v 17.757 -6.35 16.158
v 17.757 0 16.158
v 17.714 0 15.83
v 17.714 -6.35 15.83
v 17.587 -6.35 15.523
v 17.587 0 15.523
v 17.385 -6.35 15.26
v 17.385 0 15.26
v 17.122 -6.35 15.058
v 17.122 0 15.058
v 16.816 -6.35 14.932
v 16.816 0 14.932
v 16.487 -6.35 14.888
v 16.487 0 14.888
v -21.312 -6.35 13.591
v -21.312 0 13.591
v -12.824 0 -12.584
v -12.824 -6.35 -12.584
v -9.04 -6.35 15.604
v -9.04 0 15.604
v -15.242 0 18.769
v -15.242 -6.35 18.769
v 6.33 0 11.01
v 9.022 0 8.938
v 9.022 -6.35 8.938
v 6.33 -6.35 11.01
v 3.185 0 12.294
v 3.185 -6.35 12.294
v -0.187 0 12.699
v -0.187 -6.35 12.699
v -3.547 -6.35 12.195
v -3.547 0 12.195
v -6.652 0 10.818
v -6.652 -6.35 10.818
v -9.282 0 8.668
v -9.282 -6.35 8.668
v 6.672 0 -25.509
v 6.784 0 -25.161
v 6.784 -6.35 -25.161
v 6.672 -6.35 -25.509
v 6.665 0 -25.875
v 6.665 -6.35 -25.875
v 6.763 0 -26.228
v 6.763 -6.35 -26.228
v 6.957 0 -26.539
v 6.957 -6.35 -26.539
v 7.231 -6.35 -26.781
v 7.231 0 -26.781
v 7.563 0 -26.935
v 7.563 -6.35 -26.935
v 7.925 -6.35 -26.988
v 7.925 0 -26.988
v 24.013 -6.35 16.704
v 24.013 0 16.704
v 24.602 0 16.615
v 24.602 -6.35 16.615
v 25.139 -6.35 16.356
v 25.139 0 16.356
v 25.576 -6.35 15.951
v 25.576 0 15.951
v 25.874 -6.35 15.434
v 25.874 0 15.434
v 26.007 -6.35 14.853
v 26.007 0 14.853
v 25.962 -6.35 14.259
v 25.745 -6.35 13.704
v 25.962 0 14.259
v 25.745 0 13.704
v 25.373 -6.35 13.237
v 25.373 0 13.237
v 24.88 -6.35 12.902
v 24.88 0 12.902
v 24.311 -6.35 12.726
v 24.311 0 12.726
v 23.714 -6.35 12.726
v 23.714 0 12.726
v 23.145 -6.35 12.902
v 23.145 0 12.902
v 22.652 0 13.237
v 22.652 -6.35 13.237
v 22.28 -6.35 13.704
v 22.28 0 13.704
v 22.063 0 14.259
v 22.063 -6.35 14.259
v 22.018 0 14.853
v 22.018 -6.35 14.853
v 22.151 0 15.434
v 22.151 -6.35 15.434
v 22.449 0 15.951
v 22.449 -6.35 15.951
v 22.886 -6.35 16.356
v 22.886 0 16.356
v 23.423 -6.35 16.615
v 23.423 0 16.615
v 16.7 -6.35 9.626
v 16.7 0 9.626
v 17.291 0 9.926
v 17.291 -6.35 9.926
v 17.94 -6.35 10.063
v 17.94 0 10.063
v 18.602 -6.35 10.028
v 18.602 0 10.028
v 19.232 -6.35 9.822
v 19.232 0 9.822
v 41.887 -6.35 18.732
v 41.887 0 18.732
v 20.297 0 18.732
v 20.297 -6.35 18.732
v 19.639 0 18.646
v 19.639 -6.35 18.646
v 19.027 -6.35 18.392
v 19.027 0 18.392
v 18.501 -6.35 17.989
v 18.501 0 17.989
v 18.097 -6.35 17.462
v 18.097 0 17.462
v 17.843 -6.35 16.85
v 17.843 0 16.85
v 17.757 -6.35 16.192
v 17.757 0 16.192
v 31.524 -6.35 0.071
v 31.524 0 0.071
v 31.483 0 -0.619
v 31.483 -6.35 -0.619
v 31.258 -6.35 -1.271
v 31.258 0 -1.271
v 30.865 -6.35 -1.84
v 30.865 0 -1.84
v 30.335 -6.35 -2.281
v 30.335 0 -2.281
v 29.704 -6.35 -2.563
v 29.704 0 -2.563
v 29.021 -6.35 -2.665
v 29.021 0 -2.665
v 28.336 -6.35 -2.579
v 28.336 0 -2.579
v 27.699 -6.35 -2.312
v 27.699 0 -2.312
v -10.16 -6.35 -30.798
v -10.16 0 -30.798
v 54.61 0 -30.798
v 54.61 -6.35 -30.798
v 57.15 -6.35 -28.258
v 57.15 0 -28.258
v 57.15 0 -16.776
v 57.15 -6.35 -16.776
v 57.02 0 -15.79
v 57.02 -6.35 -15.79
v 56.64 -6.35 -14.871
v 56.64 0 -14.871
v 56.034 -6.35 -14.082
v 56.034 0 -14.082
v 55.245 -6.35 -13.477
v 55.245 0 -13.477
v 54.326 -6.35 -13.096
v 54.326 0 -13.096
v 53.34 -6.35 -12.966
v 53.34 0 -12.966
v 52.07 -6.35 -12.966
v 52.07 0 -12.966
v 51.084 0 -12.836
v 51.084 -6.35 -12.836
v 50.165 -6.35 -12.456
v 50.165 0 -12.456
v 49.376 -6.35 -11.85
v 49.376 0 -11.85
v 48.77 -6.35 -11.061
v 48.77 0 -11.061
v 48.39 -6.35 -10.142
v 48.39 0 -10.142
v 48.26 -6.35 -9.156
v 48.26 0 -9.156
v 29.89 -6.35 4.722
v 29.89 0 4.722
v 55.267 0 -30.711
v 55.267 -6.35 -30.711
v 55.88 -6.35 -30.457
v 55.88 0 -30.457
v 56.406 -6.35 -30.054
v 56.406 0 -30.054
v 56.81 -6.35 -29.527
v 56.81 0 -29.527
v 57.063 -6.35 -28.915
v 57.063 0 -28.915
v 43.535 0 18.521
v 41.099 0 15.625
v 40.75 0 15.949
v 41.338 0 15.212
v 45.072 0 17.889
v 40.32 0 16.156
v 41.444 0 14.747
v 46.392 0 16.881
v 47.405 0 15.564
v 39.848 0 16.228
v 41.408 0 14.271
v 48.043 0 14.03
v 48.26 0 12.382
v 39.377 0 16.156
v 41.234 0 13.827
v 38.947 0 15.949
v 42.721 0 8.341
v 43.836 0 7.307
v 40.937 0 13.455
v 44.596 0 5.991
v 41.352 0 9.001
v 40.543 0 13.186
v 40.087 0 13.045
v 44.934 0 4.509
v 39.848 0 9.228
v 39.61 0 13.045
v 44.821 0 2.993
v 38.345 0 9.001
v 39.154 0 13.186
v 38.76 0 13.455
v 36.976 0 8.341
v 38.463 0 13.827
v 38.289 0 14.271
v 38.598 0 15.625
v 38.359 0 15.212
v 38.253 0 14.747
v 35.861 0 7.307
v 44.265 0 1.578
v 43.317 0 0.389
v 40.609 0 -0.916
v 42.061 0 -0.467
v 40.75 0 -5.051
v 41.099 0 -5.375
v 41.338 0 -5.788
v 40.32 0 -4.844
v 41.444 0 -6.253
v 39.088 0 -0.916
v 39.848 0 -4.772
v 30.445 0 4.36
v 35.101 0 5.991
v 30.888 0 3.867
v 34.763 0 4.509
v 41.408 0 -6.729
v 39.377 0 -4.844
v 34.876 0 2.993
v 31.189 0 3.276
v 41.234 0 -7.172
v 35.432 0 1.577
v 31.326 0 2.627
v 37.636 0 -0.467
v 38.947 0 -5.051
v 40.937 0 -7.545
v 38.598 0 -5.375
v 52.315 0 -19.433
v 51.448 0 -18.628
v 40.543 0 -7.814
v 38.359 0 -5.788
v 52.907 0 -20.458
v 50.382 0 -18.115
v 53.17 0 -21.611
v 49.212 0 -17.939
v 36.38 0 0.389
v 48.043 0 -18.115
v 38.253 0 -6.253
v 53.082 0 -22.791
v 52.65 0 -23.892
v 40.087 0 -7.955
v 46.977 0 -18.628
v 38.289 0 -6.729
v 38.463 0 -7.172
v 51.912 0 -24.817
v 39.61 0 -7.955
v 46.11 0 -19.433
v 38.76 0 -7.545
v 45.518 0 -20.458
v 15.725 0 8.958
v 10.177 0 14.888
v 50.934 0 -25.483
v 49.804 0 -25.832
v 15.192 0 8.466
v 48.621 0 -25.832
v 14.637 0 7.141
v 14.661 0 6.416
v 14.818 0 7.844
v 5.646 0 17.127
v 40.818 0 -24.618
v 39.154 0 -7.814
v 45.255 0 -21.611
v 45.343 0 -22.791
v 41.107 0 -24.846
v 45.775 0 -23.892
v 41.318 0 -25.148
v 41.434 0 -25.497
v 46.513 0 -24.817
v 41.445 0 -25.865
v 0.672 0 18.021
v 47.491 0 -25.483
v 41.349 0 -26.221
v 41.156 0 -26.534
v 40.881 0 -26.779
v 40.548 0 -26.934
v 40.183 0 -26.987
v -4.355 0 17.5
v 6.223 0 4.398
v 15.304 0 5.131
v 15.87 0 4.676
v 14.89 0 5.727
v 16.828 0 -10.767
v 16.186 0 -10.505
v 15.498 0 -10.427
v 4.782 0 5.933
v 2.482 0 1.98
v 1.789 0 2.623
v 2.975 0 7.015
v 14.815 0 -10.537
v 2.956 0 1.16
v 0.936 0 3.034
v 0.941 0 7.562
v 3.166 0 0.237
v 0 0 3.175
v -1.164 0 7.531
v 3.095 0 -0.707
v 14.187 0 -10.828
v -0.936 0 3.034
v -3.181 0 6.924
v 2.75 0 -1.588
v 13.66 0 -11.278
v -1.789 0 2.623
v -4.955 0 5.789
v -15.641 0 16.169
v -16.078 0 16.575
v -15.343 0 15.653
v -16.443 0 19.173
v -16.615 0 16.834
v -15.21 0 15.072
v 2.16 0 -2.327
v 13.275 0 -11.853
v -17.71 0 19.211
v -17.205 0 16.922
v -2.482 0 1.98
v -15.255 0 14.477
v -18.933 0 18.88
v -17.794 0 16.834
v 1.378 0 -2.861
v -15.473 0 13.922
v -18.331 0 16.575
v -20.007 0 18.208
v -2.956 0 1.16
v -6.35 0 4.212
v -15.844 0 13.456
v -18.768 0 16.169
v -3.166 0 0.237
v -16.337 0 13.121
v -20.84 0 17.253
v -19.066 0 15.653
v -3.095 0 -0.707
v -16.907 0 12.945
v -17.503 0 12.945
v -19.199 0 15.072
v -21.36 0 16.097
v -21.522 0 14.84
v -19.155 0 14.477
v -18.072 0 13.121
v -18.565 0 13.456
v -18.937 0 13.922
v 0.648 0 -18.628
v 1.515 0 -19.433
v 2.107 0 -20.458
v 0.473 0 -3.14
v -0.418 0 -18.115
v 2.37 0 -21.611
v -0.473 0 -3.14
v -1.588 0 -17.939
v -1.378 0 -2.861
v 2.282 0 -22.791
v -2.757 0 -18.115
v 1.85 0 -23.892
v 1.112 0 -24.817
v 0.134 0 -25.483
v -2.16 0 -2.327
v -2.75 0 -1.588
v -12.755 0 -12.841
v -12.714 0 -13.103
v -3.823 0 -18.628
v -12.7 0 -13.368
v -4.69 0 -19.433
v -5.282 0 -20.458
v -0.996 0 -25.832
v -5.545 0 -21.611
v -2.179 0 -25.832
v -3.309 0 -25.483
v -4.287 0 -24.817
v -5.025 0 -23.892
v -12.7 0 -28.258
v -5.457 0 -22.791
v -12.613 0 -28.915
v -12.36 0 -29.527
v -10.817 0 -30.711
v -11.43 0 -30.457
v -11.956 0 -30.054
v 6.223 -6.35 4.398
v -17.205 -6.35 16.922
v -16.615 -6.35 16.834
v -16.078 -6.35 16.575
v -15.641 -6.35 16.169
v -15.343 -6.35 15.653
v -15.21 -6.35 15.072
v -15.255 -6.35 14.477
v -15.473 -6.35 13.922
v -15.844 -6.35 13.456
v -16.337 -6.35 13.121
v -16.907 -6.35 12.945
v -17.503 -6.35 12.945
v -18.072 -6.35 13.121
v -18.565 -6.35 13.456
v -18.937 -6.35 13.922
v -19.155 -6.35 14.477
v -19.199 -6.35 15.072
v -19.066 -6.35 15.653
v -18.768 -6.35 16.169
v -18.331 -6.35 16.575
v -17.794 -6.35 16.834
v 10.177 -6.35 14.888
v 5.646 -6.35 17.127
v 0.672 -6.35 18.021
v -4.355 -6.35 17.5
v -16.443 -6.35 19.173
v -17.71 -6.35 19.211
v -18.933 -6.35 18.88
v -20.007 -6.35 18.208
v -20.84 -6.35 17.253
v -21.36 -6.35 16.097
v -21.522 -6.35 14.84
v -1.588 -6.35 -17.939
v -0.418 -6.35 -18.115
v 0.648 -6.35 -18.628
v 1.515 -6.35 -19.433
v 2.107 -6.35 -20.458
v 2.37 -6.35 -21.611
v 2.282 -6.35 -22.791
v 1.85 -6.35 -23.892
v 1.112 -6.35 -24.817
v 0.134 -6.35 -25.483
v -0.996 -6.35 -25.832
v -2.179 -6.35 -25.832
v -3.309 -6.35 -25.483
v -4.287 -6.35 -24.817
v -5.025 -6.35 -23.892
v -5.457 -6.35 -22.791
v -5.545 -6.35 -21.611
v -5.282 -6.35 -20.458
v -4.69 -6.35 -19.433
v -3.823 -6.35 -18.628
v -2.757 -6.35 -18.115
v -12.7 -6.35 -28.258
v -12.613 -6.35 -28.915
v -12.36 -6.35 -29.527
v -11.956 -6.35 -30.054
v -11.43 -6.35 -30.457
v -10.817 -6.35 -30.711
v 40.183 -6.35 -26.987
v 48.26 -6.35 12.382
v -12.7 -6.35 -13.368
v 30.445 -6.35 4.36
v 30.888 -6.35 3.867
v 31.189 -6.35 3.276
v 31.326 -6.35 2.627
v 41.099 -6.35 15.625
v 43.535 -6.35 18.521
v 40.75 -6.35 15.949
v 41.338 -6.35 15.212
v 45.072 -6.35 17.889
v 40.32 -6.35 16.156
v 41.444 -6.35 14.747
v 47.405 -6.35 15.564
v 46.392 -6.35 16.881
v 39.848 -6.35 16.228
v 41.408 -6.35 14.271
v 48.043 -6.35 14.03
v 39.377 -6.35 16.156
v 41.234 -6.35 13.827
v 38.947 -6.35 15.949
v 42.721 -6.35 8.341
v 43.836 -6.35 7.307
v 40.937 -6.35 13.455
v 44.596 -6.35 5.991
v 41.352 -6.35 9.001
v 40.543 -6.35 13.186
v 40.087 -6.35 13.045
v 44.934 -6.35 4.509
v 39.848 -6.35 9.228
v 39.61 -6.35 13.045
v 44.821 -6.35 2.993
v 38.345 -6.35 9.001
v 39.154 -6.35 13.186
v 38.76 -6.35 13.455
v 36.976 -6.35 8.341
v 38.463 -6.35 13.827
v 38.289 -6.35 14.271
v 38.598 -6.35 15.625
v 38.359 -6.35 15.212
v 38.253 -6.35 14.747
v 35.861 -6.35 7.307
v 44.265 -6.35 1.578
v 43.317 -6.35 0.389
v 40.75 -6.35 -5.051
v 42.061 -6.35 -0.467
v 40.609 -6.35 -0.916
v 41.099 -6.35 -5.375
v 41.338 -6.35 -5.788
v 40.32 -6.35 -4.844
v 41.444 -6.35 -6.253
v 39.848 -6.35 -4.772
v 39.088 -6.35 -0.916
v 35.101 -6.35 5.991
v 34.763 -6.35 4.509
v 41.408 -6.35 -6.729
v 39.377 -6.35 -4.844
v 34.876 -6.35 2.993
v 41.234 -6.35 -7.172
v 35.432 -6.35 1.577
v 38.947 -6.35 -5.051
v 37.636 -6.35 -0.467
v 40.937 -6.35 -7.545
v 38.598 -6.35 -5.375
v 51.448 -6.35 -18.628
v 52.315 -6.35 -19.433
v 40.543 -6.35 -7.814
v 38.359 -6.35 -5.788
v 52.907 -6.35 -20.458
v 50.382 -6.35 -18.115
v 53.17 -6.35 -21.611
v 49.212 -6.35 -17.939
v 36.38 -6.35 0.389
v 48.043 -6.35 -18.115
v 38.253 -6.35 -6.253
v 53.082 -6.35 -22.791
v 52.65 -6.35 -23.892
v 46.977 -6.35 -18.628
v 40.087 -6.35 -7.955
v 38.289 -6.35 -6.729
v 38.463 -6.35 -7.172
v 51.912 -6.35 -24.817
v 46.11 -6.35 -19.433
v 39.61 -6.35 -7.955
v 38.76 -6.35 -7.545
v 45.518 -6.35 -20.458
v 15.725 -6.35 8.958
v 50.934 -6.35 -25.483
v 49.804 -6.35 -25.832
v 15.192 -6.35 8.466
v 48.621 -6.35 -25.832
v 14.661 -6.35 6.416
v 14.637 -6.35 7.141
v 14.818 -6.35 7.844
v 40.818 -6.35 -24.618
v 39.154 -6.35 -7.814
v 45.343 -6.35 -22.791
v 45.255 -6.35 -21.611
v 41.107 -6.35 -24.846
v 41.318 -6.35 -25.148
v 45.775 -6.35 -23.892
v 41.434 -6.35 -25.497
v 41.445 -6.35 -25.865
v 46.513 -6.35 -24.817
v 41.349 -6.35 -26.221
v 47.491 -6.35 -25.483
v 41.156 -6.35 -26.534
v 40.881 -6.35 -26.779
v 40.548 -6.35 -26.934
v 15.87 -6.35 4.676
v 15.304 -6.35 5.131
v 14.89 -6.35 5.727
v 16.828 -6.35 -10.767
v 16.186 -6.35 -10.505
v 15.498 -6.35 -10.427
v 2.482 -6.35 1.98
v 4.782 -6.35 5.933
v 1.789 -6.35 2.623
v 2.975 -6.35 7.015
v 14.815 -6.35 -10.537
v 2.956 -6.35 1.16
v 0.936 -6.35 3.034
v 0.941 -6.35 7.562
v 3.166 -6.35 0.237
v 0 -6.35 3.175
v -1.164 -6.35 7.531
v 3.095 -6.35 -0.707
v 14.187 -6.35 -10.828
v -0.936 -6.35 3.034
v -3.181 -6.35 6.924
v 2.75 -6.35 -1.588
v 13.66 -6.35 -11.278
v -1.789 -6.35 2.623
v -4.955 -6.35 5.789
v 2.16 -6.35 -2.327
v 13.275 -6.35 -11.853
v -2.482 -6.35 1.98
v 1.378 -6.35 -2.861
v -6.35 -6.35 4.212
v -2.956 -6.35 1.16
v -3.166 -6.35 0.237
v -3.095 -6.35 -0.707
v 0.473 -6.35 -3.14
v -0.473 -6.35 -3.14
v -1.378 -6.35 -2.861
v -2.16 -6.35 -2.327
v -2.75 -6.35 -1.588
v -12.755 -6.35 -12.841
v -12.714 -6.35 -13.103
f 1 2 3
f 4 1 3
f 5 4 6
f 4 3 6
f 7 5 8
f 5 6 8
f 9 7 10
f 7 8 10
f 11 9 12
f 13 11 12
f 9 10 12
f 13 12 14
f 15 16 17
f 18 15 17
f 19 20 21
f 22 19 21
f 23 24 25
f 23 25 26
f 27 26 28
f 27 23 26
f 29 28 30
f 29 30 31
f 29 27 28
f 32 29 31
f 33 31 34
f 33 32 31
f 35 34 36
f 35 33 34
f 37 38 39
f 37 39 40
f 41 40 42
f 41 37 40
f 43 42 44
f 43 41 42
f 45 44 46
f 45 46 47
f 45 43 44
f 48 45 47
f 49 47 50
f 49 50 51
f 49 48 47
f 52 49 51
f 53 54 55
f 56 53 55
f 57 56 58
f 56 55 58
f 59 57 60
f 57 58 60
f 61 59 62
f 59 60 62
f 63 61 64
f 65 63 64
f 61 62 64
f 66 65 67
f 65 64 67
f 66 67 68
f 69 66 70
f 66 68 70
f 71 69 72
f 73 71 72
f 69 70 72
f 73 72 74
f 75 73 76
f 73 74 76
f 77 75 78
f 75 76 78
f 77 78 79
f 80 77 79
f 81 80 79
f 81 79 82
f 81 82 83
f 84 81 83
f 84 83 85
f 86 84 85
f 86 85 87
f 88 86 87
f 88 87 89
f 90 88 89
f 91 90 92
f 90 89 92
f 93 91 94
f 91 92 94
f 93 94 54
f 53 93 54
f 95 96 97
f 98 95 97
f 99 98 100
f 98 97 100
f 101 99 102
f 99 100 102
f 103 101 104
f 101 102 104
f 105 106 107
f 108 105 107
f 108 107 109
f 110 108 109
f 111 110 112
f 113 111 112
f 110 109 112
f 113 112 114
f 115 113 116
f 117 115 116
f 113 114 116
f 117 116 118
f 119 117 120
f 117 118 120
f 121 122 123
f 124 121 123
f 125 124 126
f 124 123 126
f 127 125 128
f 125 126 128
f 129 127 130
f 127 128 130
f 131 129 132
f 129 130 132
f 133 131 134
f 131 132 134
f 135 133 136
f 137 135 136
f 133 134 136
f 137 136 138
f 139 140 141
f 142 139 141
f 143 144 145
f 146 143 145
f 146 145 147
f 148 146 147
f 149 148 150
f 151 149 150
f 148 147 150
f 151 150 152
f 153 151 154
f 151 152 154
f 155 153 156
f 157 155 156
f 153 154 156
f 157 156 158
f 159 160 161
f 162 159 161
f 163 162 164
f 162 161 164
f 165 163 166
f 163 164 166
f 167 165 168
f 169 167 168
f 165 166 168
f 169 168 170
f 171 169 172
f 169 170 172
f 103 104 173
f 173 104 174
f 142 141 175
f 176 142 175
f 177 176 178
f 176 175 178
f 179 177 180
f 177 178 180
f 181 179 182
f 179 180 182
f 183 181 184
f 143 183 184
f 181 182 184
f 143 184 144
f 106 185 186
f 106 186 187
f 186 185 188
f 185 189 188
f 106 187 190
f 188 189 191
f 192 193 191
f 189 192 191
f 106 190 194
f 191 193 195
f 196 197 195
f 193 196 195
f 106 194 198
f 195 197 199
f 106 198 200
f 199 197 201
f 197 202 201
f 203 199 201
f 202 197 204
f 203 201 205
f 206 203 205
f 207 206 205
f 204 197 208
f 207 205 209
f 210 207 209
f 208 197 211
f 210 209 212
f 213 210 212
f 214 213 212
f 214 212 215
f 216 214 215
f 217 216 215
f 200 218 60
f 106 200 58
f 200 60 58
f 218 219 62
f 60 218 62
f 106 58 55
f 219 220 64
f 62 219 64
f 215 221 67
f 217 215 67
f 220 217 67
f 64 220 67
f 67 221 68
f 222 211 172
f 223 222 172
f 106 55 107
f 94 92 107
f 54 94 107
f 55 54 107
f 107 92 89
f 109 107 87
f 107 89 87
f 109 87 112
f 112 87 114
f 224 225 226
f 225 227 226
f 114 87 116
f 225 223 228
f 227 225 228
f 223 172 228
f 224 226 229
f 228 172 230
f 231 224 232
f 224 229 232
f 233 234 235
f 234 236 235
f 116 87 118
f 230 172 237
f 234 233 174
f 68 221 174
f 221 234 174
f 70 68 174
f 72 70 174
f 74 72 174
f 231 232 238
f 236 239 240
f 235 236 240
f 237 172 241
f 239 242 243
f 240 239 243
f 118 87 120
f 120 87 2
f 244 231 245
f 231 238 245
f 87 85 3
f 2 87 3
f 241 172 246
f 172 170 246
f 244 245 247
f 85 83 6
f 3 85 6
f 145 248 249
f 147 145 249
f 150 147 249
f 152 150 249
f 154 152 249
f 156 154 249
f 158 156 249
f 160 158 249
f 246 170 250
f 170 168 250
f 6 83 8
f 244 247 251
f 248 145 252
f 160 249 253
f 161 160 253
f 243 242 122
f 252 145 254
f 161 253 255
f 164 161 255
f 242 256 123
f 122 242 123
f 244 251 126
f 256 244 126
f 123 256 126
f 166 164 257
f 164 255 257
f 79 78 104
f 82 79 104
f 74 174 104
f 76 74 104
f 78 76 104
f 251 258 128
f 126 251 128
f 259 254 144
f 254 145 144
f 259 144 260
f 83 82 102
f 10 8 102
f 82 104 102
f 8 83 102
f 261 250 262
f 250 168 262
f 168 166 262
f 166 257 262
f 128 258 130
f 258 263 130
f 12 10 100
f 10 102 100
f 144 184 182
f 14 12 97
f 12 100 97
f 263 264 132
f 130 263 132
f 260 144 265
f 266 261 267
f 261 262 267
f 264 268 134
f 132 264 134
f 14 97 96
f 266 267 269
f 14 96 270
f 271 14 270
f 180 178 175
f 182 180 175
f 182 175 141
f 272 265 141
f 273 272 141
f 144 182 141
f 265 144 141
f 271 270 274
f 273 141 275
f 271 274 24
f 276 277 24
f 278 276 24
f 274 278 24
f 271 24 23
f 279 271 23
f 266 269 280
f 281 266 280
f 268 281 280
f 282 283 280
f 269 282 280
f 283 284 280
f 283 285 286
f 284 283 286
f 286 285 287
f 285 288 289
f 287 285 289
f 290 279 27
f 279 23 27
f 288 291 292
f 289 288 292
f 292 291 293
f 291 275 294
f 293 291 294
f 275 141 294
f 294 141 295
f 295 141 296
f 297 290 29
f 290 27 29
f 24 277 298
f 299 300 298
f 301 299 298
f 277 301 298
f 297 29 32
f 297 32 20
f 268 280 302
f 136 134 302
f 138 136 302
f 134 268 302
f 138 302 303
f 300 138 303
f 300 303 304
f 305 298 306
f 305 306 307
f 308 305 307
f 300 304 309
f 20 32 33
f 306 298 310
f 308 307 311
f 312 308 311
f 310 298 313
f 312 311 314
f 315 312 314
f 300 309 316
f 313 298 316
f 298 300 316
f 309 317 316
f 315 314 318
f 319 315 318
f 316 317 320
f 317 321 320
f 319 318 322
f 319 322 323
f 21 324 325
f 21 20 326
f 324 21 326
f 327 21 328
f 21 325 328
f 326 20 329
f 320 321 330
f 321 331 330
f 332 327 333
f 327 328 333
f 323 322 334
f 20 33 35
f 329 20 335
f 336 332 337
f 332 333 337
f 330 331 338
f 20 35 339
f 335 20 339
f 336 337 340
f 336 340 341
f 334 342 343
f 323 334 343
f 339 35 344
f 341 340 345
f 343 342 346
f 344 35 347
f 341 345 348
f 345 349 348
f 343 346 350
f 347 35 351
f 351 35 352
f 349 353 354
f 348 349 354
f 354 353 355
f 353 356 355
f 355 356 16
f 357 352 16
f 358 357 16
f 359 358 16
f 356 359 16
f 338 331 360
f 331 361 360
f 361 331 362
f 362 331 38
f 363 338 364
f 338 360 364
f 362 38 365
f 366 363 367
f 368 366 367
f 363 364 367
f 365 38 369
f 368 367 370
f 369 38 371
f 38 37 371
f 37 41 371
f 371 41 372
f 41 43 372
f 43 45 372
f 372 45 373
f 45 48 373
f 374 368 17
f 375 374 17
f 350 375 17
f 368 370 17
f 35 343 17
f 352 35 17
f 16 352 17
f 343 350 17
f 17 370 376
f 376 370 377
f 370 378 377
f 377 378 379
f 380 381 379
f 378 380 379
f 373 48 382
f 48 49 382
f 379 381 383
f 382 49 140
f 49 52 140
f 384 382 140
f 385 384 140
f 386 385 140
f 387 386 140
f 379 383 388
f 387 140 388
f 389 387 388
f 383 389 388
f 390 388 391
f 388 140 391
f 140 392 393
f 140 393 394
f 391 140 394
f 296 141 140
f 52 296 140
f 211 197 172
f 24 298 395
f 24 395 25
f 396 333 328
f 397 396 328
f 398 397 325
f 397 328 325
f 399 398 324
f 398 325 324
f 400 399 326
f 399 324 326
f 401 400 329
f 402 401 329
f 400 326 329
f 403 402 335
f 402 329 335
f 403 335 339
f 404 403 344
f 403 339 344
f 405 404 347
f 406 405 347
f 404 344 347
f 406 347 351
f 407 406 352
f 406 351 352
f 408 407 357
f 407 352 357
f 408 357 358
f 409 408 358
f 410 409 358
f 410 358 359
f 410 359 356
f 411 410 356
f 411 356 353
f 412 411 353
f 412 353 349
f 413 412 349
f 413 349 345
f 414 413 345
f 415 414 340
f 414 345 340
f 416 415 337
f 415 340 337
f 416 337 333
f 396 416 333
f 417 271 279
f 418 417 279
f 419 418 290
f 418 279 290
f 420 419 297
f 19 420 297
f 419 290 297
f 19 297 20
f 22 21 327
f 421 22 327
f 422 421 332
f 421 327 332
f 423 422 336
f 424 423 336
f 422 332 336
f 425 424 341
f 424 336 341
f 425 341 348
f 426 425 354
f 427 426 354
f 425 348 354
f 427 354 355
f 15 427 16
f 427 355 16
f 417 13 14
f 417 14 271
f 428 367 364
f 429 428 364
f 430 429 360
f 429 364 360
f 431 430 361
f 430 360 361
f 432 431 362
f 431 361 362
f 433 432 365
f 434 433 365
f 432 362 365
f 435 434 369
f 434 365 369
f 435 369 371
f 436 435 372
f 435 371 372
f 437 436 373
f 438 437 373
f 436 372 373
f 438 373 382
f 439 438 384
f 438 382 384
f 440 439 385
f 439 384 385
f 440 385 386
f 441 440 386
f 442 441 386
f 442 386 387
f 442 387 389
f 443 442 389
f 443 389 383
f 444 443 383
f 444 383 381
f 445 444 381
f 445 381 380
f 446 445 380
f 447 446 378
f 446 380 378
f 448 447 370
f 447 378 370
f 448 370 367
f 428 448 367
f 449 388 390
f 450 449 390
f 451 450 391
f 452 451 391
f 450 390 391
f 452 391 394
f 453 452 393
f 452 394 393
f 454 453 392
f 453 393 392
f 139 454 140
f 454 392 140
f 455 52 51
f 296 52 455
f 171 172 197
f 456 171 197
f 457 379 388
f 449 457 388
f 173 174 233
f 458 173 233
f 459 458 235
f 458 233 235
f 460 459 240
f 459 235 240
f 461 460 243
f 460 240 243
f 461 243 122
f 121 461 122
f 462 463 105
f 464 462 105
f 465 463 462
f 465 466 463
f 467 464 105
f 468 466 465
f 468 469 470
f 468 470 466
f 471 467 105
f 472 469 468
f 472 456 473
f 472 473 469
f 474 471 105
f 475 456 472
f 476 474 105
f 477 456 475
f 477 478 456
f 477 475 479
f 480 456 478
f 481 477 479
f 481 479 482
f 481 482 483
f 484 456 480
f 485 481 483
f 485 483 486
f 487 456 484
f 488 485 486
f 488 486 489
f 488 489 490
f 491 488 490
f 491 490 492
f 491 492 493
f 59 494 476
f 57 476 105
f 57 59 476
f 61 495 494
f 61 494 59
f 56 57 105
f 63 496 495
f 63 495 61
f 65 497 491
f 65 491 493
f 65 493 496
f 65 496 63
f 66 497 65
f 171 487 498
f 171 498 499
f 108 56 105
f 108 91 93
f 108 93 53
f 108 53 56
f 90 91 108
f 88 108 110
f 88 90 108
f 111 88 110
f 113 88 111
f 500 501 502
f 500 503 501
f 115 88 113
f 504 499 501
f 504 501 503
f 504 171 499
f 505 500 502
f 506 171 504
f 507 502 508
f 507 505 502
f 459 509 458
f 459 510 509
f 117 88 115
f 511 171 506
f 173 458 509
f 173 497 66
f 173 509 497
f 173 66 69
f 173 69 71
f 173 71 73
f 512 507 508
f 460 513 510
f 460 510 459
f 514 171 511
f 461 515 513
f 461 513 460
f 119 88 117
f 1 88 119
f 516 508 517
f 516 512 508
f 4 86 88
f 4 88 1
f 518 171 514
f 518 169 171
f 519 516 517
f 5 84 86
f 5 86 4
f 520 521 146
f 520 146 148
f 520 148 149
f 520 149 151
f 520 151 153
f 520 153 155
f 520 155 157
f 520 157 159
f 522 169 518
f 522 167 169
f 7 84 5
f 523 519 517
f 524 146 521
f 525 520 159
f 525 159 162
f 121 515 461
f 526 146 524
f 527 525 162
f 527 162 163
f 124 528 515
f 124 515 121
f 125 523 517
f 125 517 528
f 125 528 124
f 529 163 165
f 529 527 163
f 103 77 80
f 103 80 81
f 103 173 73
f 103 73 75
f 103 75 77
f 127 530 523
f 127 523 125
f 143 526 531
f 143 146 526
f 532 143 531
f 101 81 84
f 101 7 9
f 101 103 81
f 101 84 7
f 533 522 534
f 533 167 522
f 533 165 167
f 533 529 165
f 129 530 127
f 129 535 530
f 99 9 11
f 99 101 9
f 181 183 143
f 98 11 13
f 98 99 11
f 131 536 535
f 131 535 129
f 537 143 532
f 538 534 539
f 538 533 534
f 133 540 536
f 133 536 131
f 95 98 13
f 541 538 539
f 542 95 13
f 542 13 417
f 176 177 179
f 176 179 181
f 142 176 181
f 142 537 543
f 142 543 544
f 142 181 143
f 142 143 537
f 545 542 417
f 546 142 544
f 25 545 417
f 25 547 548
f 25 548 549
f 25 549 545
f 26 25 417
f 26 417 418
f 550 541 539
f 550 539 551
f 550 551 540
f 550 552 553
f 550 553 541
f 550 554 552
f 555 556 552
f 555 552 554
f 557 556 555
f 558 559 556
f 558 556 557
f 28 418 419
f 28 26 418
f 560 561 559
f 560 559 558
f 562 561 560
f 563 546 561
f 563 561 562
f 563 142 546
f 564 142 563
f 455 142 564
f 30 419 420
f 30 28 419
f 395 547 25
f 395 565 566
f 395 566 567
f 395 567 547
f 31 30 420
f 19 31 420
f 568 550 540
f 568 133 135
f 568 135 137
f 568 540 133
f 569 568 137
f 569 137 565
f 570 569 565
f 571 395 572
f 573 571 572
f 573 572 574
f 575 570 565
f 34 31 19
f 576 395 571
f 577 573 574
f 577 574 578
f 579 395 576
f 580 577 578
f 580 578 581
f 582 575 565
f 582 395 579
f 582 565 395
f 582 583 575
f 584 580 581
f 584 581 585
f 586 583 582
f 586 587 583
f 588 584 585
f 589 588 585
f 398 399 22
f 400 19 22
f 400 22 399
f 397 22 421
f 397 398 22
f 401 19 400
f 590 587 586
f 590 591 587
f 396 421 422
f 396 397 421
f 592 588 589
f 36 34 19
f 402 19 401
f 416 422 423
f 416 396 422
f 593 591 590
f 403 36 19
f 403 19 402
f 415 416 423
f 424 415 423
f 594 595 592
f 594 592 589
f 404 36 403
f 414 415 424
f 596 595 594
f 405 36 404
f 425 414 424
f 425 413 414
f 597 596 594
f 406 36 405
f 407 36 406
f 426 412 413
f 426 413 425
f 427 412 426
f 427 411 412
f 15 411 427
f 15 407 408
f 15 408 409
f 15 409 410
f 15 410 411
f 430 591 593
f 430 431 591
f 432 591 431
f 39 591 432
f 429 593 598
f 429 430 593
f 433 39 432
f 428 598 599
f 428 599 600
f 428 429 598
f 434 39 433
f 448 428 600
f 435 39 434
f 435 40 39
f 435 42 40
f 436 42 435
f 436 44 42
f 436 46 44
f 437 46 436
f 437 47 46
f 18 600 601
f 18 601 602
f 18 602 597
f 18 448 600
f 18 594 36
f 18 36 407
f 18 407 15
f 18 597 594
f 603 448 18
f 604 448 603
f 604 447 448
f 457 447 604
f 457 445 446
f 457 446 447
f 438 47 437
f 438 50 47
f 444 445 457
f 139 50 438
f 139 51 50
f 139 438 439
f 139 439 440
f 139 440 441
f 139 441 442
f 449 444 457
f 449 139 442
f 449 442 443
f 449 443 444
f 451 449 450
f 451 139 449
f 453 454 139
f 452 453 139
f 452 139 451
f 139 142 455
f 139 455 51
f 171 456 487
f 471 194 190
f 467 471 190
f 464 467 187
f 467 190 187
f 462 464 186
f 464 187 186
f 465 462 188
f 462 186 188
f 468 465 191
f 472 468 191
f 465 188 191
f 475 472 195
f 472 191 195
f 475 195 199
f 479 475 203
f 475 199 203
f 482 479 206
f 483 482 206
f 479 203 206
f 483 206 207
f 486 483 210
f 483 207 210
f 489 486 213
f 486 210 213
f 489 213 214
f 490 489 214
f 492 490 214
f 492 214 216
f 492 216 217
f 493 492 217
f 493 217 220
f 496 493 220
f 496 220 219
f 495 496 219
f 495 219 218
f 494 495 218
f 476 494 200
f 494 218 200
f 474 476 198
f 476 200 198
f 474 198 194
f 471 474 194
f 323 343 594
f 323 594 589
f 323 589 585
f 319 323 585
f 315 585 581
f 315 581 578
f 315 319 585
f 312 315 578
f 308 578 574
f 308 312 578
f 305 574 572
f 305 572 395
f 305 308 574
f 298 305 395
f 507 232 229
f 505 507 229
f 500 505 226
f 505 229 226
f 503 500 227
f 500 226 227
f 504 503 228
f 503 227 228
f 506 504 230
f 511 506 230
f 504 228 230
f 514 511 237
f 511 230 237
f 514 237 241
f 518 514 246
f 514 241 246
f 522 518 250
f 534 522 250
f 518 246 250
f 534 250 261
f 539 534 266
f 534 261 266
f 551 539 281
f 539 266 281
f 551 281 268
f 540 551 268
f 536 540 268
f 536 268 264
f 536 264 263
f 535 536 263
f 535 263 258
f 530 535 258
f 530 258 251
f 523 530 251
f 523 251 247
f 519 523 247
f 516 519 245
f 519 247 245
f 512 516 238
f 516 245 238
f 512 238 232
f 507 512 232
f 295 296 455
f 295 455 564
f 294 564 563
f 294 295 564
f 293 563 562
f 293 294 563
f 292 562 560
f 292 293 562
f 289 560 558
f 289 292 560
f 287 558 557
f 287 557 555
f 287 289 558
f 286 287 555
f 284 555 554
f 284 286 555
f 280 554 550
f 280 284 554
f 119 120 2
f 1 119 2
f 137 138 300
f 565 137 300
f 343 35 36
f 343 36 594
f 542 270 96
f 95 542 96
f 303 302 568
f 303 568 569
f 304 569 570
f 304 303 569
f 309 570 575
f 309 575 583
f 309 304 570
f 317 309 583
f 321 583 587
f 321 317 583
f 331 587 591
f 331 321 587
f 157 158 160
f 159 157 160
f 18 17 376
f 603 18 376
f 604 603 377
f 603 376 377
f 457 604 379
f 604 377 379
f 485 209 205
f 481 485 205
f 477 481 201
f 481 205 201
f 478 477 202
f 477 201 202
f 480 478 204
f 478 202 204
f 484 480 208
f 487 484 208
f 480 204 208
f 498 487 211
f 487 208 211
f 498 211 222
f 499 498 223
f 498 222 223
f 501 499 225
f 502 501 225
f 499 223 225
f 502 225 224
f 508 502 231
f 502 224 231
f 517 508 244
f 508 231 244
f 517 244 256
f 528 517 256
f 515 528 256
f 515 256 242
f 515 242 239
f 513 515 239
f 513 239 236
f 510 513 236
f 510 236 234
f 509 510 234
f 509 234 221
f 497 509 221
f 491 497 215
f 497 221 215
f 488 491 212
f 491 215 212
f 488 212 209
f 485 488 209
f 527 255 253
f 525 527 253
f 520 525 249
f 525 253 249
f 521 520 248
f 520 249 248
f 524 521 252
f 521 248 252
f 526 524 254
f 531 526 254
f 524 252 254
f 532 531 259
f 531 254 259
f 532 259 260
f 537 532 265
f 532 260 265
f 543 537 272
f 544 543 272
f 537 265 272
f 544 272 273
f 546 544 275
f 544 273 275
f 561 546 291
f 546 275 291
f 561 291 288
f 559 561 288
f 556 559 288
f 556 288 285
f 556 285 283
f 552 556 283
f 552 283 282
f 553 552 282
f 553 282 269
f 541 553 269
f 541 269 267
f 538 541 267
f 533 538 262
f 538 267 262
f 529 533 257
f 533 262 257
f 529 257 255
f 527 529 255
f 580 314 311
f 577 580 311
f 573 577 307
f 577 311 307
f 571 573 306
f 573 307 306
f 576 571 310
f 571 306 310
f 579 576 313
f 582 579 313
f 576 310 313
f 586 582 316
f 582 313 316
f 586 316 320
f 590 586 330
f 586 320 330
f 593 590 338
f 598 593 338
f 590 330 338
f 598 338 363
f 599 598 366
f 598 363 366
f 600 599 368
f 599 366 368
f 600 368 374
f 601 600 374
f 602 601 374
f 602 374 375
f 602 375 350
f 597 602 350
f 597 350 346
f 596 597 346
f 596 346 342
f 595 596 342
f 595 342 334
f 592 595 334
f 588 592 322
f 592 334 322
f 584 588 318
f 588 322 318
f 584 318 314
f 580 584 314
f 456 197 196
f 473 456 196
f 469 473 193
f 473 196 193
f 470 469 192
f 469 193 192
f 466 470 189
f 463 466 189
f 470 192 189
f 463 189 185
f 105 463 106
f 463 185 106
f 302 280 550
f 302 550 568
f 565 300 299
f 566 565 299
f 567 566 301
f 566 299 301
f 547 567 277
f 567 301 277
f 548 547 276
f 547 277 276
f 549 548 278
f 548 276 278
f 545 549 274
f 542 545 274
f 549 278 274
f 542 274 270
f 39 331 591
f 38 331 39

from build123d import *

# Parameters (mm, degrees)
SKETCH4_R           = 3.175
SKETCH4_R_2         = 3.96875
SKETCH4_R_3         = 5.1
SKETCH4_R_4         = 1.6
SKETCH4_R_5         = 2
BOSS_EXTRUDE2_DEPTH = 6.35


with BuildPart() as part:
    # Sketch4 → Boss-Extrude2 (new body)
    with BuildSketch(Plane(origin=(0, 0, 0), x_dir=(1, 0, 0), z_dir=(0, 1, 0))):
        with BuildLine():
            Line((41.886832424, -18.732457737), (20.296832424, -18.732457737))
            ThreePointArc((20.296832424, -18.732457737), (18.500781199, -17.988508961), (17.756832424, -16.192457737))
            Line((17.756832424, -16.192457737), (17.756832424, -16.158228087))
            ThreePointArc((17.756832424, -16.158228087), (17.384858036, -15.260202475), (16.486832424, -14.888228087))
            Line((16.486832424, -14.888228087), (10.176729358, -14.888228087))
            ThreePointArc((10.176729358, -14.888228087), (0.671575018, -18.021491142), (-9.04041606, -15.604359438))
            Line((-9.04041606, -15.604359438), (-15.242136468, -18.768748092))
            ThreePointArc((-15.242136468, -18.768748092), (-20.007104805, -18.207530981), (-21.312082241, -13.59050577))
            Line((-21.312082241, -13.59050577), (-12.82386942, 12.584286272))
            ThreePointArc((-12.82386942, 12.584286272), (-12.731158467, 12.971183794), (-12.7, 13.36781229))
            Line((-12.7, 13.36781229), (-12.7, 28.2575))
            ThreePointArc((-12.7, 28.2575), (-11.956051224, 30.053551224), (-10.16, 30.7975))
            Line((-10.16, 30.7975), (54.61, 30.7975))
            ThreePointArc((54.61, 30.7975), (56.406051224, 30.053551224), (57.15, 28.2575))
            Line((57.15, 28.2575), (57.15, 16.776257881))
            ThreePointArc((57.15, 16.776257881), (56.034076836, 14.082181045), (53.34, 12.966257881))
            Line((53.34, 12.966257881), (52.07, 12.966257881))
            ThreePointArc((52.07, 12.966257881), (49.375923164, 11.850334717), (48.26, 9.156257881))
            Line((48.26, 9.156257881), (48.26, -12.3825))
            ThreePointArc((48.26, -12.3825), (46.391929601, -16.880811578), (41.886832424, -18.732457737))
        make_face()
        with Locations(Location((0, 0, 0), (0, 0, 270))):
            Circle(SKETCH4_R, mode=Mode.SUBTRACT)
        with Locations(Location((-1.5875, 21.9075, 0), (0, 0, 270))):
            Circle(SKETCH4_R_2, mode=Mode.SUBTRACT)
        with Locations(Location((49.2125, 21.9075, 0), (0, 0, 270))):
            Circle(SKETCH4_R_2, mode=Mode.SUBTRACT)
        with Locations(Location((39.848481715, -4.1275, 0), (0, 0, 270))):
            Circle(SKETCH4_R_3, mode=Mode.SUBTRACT)
        with Locations(Location((39.848481715, -14.6275, 0), (0, 0, 270))):
            Circle(SKETCH4_R_4, mode=Mode.SUBTRACT)
        with Locations(Location((39.848481715, 6.3725, 0), (0, 0, 270))):
            Circle(SKETCH4_R_4, mode=Mode.SUBTRACT)
        with Locations(Location((24.012521227, -14.703599027, 0), (0, 0, 270))):
            Circle(SKETCH4_R_5, mode=Mode.SUBTRACT)
        with Locations(Location((-17.204660255, -14.9225, 0), (0, 0, 270))):
            Circle(SKETCH4_R_5, mode=Mode.SUBTRACT)
        with BuildLine():
            Line((40.81829921, 24.617647737), (16.8275, 10.766553356))
            ThreePointArc((16.8275, 10.766553356), (14.81487587, 10.537243801), (13.274563122, 11.852795168))
            Line((13.274563122, 11.852795168), (6.783830771, 25.160768644))
            ThreePointArc((6.783830771, 25.160768644), (6.848278127, 26.390497466), (7.92529921, 26.9875))
            Line((7.92529921, 26.9875), (40.18329921, 26.9875))
            ThreePointArc((40.18329921, 26.9875), (41.410025009, 26.046200187), (40.81829921, 24.617647737))
        make_face(mode=Mode.SUBTRACT)
        with BuildLine():
            Line((31.325699228, -2.62693366), (31.523640252, -0.070720194))
            ThreePointArc((31.523640252, -0.070720194), (30.334503757, 2.281113068), (27.699320049, 2.312291862))
            Line((27.699320049, 2.312291862), (15.869577834, -4.676031684))
            ThreePointArc((15.869577834, -4.676031684), (14.622916882, -6.777495975), (15.725443447, -8.958035098))
            Line((15.725443447, -8.958035098), (16.699675668, -9.625802289))
            ThreePointArc((16.699675668, -9.625802289), (17.939612893, -10.063131328), (19.232094548, -9.821900773))
            Line((19.232094548, -9.821900773), (29.889663519, -4.722023501))
            ThreePointArc((29.889663519, -4.722023501), (30.888370189, -3.866870885), (31.325699228, -2.62693366))
        make_face(mode=Mode.SUBTRACT)
        with BuildLine():
            Line((6.222926422, -4.3976797), (9.022181232, -8.938134359))
            ThreePointArc((9.022181232, -8.938134359), (-0.187421307, -12.698616982), (-9.282033212, -8.667978971))
            Line((-9.282033212, -8.667978971), (-6.35, -4.212113484))
            ThreePointArc((-6.35, -4.212113484), (-0.112452784, -7.619170189), (6.222926422, -4.3976797))
        make_face(mode=Mode.SUBTRACT)
    extrude(amount=-BOSS_EXTRUDE2_DEPTH)


solid = part.part
